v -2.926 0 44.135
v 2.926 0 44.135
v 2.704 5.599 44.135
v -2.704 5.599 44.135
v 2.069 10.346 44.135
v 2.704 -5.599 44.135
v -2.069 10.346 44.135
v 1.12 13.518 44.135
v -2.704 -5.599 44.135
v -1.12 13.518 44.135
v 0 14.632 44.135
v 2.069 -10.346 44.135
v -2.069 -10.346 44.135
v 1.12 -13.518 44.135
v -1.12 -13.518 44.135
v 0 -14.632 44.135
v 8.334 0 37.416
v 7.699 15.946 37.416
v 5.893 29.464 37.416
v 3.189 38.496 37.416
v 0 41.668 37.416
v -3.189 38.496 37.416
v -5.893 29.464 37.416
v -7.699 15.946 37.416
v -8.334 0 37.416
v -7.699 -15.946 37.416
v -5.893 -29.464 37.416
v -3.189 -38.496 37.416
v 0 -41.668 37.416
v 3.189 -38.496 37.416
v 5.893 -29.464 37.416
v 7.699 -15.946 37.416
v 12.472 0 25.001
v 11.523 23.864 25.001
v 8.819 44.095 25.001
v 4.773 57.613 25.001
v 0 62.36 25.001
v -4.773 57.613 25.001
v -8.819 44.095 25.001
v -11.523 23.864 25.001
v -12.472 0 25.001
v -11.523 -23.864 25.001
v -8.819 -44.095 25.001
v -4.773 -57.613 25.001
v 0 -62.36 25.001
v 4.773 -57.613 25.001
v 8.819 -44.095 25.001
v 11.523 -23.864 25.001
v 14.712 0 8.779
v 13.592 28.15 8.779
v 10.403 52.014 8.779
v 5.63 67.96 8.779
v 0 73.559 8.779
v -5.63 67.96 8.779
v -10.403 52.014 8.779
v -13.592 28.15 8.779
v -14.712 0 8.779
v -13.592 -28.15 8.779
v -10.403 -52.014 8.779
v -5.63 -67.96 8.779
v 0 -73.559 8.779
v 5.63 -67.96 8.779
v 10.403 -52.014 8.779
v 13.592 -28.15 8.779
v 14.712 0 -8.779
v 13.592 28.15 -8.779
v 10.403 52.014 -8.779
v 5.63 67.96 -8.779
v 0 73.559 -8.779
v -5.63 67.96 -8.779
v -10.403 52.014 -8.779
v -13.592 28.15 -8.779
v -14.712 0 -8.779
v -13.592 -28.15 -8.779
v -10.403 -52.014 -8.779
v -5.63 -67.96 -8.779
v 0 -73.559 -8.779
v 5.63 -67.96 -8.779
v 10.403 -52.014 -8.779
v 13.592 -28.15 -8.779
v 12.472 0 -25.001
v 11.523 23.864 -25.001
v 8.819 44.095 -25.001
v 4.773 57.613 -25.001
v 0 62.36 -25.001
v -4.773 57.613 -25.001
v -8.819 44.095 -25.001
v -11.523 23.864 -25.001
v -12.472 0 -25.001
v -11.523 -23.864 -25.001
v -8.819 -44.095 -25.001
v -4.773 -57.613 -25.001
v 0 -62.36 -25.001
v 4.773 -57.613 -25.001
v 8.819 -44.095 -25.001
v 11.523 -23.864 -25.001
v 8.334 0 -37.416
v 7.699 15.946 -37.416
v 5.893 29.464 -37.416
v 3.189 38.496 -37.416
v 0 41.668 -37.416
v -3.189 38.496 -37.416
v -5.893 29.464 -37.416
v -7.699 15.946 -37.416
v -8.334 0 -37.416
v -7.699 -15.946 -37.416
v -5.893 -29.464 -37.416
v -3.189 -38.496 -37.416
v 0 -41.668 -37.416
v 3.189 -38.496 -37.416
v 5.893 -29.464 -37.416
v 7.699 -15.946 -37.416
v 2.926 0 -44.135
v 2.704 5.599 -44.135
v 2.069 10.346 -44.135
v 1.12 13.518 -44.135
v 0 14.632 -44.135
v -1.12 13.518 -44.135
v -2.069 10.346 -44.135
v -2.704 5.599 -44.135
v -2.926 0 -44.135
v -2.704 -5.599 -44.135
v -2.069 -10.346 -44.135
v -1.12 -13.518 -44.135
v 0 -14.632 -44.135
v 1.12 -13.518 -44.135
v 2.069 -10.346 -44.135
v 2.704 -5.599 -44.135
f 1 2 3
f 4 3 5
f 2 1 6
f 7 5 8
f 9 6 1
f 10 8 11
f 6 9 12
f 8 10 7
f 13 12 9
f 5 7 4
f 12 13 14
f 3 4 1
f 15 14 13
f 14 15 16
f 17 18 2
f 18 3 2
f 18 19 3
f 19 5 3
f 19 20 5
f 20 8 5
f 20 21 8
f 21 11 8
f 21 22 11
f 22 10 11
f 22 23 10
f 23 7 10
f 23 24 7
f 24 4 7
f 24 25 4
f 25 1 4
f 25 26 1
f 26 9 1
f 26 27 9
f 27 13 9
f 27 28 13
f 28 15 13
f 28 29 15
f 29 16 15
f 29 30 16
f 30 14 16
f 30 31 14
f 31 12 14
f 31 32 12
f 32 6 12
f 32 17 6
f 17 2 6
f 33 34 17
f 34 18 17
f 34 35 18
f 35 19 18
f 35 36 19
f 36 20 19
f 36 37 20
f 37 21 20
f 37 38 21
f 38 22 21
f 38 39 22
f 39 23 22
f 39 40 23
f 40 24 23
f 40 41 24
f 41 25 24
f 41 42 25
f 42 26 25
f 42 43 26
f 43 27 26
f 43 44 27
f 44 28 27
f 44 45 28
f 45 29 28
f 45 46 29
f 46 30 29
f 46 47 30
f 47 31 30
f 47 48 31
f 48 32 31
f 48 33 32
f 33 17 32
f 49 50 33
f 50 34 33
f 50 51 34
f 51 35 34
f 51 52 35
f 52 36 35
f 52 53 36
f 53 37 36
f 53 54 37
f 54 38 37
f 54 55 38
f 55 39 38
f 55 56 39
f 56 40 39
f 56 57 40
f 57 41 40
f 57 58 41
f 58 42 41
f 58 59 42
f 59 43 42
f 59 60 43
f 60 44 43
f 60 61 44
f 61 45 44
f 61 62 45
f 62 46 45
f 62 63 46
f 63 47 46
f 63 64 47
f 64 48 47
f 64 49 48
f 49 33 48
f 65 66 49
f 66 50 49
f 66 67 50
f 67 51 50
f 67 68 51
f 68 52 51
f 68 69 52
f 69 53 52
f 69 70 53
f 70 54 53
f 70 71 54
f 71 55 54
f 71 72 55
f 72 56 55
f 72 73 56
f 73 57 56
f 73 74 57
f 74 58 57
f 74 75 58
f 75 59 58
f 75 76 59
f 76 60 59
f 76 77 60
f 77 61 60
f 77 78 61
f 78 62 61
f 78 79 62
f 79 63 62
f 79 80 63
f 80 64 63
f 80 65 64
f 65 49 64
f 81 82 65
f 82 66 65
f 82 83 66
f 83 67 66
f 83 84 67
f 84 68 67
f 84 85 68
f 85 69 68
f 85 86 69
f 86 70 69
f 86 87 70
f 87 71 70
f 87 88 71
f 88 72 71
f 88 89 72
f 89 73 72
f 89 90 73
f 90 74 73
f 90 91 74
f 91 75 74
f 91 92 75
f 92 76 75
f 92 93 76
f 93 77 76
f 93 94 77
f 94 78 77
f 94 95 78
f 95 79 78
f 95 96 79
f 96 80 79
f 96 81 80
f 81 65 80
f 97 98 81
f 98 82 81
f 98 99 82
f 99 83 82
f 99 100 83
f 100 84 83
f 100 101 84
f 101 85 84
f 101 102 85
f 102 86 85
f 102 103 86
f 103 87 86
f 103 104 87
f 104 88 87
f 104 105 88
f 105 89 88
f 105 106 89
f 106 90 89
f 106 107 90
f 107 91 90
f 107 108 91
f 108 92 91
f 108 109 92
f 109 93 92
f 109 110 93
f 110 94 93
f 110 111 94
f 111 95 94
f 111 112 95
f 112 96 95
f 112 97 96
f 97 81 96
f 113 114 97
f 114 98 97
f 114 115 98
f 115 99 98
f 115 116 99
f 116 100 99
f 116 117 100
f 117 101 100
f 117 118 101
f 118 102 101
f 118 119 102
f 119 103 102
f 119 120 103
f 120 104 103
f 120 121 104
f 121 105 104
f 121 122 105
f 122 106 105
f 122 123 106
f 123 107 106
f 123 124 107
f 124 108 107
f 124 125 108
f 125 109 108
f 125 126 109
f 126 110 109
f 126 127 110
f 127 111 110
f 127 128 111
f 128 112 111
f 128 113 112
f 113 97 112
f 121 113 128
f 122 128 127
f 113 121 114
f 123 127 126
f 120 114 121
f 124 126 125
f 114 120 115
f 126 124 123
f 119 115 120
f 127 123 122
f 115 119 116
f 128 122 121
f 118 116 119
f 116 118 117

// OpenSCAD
// Generated by SolidPython 1.0.1 on 2020-07-29 00:46:45


scale(v = [3, 15, 9]) {
	sphere(r = 5);
}
/***********************************************
*********      SolidPython code:      **********
************************************************
 
# import packages: SolidPython
from solid import *
from solid.utils import *
from itertools import chain, combinations, permutations


class Resize:

    def __init__(self, scad_file):
        self.scad_file = scad_file
        #self.scad_file = import_scad(scad_file)
        # cone/cylinder param:
        self.r1 = 0
        self.r2 = 0
        self.h = 0
        # rectangular prism param:
        self.w = 0
        self.l = 0
        # ellipse param:
        self.r = 0

    # import OpenScad code (file name corresponds to shape)


    # classify shape + parameters
    def assign(self, param1, param2, param3):
        if self.scad_file == 'cone.scad':
            self.r1 = param1
            self.r2 = param2
            self.h = param3
        elif self.scad_file == 'cylinder.scad':
            self.r1 = param1
            self.r2 = param2
            self.h = param3
        elif self.scad_file == 'rectangularPrism.scad':
            self.h = param1
            self.l = param2
            self.w = param3
        else:
            self.r = param1
            self.h = param2

    # resize parameters
    def iterate(self):
        x = range(3, 20, 2)
        i = 1
        if self.scad_file == 'cone.scad':
            tempList = list(permutations(x, 2))
            for temp in tempList:
                param1 = temp[0]
                param2 = temp[1]
                filepath = 'produced_scad_files/' + 'cone' + str(param1) + '_' + str(param2) + '_' + '.scad'
                scad_render_to_file(cylinder(h=param1, r1=param2, r2=0), filepath)

        elif self.scad_file == 'cylinder.scad':
            tempList = list(permutations(x, 3))
            for temp in tempList:
                param1 = temp[0]
                param2 = temp[1]
                filepath = 'produced_scad_files/' + 'cylinder' + str(param1) + '_' + str(param2) + '_' + '.scad'
                scad_render_to_file(cylinder(h=param1, r1=param2, r2=param2), filepath)

        elif self.scad_file == 'rectangularPrism.scad':
            tempList = list(permutations(x, 3))
            for temp in tempList:
                param1 = temp[0]
                param2 = temp[1]
                param3 = temp[2]
                filepath = 'produced_scad_files/' + 'rectangularPrism' + str(param1) + '_' + str(param2) + '_' + str(
                    param3) + '.scad'
                scad_render_to_file(cube(size=(param1, param2, param3)), filepath)

        elif self.scad_file == 'ellipse.scad':
            tempList = list(permutations(x, 4))
            for temp in tempList:
                param1 = temp[0]
                param2 = temp[1]
                param3 = temp[2]
                param4 = temp[3]
                filepath = 'produced_scad_files/' + 'ellipse' + str(param1) + '_' + str(param2) + '_' + str(param3) + '_' + str(param4) + '.scad'
                scad_render_to_file(scale([param1, param2, param3])(sphere(r=param4)), filepath)

    def render_to_scadfile(self):
        scad_render_to_file(scad, 'example.scad') 
 
************************************************/
